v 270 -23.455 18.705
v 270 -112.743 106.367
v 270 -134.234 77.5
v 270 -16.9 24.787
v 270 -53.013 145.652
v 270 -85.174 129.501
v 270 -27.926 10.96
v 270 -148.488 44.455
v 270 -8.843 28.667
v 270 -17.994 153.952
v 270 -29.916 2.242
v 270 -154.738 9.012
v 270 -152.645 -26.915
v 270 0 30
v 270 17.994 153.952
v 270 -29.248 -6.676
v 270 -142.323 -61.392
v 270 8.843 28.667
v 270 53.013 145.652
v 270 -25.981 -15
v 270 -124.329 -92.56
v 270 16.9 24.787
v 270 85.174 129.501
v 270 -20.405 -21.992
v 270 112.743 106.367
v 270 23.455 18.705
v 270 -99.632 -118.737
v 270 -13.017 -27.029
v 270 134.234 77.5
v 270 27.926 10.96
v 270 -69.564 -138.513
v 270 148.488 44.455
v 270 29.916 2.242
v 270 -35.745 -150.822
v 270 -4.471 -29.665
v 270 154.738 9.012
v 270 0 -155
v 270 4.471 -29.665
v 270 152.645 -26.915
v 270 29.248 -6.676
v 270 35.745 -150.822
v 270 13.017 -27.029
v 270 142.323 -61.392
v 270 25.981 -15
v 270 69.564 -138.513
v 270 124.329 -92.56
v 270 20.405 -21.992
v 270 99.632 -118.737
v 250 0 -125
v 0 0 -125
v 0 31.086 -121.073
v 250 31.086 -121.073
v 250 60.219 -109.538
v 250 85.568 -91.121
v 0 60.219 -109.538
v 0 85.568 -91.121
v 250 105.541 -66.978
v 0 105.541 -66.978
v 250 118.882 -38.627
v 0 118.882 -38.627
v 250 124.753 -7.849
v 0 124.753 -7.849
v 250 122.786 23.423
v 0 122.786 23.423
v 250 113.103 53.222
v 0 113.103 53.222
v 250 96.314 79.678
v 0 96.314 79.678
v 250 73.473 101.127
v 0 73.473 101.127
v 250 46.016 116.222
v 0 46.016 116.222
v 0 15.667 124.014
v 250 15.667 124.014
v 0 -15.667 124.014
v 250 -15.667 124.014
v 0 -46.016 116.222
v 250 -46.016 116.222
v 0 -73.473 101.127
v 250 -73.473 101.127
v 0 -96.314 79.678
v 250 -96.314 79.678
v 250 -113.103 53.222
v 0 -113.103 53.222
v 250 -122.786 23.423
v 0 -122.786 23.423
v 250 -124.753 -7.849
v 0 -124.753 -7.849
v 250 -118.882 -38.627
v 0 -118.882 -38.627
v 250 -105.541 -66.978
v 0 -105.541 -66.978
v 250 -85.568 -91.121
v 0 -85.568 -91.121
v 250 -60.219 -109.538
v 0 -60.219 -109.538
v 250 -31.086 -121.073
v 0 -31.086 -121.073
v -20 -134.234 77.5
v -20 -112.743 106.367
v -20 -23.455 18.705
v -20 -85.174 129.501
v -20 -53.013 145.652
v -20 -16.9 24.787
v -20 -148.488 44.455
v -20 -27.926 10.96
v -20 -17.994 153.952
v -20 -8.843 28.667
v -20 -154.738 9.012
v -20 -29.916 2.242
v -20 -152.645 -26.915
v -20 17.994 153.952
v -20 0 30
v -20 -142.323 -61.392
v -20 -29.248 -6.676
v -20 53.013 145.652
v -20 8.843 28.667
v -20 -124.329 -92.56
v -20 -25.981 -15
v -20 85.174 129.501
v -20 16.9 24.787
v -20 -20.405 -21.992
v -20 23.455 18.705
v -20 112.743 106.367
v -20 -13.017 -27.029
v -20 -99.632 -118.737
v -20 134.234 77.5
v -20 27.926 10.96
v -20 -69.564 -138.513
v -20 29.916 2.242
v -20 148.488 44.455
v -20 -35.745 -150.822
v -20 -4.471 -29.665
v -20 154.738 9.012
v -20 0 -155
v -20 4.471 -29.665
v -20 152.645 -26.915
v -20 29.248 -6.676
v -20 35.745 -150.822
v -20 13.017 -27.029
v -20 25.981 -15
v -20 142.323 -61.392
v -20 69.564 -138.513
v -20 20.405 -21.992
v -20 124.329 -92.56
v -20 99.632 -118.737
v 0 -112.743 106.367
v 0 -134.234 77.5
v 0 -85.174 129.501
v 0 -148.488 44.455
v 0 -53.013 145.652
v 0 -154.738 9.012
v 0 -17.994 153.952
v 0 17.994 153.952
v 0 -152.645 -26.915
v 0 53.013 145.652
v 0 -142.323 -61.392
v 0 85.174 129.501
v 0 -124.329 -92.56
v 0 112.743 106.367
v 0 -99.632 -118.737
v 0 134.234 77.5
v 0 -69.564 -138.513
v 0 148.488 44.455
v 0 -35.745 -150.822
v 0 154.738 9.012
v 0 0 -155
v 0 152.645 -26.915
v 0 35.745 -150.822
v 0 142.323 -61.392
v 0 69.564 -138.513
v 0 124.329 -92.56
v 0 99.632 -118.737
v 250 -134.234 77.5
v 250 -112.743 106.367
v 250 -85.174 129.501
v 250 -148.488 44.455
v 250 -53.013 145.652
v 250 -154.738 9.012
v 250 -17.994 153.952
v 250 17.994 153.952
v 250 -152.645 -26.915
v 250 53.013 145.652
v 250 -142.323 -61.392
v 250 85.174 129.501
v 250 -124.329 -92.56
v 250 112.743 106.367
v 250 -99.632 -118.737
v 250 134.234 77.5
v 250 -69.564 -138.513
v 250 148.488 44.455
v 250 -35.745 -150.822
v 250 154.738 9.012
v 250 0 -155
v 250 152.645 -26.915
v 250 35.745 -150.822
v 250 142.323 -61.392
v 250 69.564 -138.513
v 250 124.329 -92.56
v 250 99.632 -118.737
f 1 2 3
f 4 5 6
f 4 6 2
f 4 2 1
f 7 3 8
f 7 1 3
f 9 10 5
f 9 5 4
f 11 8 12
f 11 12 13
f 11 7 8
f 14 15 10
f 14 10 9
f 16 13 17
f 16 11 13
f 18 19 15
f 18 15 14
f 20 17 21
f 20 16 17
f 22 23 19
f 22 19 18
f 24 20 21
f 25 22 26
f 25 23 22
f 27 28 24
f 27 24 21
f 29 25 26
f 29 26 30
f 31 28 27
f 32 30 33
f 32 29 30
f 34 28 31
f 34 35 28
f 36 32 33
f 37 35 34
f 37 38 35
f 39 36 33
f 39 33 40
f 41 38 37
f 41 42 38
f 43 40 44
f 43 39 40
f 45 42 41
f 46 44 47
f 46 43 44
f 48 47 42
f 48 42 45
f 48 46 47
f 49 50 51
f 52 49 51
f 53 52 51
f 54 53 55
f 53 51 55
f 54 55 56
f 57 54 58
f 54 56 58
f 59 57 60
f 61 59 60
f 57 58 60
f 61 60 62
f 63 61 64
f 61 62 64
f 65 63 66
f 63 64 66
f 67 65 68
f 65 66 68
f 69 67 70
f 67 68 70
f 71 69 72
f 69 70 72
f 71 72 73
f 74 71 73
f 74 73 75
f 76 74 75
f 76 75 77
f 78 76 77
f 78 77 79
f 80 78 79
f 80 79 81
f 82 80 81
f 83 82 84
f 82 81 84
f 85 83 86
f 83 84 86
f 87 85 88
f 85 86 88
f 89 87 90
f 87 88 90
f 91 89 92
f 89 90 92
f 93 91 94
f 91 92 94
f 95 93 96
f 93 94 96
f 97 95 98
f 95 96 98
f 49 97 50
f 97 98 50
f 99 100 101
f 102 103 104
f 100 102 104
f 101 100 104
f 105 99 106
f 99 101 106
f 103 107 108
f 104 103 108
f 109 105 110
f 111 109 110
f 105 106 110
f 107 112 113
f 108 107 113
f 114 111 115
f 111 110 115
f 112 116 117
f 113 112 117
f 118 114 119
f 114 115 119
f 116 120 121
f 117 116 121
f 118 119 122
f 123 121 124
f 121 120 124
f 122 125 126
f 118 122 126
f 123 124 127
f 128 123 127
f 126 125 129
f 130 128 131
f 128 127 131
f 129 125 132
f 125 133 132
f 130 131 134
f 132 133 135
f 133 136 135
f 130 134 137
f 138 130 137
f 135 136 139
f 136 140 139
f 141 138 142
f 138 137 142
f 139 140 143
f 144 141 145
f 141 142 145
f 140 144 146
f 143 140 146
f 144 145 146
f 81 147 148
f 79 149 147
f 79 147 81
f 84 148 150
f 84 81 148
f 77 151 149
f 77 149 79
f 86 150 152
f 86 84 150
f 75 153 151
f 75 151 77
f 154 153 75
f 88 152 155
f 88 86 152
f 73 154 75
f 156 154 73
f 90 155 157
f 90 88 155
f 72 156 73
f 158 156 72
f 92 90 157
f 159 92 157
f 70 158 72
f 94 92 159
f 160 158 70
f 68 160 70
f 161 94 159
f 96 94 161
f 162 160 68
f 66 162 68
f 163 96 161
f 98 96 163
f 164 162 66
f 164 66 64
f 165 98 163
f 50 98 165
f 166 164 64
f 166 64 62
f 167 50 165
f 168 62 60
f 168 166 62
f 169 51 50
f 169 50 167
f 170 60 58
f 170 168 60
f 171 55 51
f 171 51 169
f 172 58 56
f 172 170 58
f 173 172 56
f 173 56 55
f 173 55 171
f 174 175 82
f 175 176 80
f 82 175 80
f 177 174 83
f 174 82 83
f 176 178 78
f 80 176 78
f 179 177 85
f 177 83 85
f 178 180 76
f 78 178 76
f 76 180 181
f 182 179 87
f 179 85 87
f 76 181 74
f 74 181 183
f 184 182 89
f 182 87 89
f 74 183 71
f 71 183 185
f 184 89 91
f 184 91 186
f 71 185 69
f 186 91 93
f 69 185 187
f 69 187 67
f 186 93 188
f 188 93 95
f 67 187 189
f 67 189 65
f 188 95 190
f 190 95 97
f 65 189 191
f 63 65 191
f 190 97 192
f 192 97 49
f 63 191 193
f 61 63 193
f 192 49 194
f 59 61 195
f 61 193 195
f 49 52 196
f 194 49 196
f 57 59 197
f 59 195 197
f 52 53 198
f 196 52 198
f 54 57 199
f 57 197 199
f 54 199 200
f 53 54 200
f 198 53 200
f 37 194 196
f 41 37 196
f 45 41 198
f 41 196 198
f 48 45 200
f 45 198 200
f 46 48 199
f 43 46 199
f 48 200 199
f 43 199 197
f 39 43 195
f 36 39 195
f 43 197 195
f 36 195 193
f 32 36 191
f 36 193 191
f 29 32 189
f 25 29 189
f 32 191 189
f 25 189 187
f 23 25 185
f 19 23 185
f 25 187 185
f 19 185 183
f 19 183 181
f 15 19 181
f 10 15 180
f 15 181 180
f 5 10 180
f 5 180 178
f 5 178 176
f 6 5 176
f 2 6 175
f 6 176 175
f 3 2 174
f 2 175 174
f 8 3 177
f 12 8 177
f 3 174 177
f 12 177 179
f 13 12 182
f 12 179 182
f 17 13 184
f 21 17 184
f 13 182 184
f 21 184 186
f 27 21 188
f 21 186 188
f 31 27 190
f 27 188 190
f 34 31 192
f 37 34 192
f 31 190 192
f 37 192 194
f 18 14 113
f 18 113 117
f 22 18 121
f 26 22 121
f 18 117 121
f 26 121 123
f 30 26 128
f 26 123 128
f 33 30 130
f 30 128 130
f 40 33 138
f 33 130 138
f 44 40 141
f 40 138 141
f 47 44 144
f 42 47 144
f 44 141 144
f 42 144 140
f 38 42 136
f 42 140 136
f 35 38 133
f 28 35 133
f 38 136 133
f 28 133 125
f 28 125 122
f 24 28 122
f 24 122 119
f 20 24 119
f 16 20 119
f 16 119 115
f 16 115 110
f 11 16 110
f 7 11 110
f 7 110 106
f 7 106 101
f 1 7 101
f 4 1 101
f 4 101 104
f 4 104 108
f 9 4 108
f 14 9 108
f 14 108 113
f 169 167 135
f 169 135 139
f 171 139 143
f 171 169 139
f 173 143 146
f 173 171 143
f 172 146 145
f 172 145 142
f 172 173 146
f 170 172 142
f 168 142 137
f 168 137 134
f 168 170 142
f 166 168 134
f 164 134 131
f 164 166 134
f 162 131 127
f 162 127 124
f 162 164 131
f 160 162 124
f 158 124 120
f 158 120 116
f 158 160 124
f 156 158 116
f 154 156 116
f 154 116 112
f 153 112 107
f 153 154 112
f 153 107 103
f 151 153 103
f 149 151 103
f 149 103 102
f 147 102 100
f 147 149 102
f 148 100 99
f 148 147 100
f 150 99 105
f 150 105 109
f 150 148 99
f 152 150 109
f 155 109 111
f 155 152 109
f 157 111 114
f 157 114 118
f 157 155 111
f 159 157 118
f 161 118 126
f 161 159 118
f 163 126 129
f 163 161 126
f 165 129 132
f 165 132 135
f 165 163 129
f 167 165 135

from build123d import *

# Parameters (mm, degrees)
SKETCH1_R           = 125
BOSS_EXTRUDE1_DEPTH = 250
SKETCH2_R           = 155
BOSS_EXTRUDE2_DEPTH = 20
SKETCH3_R           = 30
CUT_EXTRUDE1_DEPTH  = 364.524414586


with BuildPart() as part:
    # Sketch1 → Boss-Extrude1 (new body)
    with BuildSketch(Plane(origin=(0, 0, 0), x_dir=(0, 0, -1), z_dir=(1, 0, 0))):
        Circle(SKETCH1_R)
    extrude(amount=BOSS_EXTRUDE1_DEPTH)

    # Sketch2 → Boss-Extrude2 (add)
    with BuildSketch(Plane(origin=(0, 0, 0), x_dir=(0, 0, -1), z_dir=(1, 0, 0))):
        Circle(SKETCH2_R)
    boss_extrude2 = extrude(amount=-BOSS_EXTRUDE2_DEPTH)

    # Mirror1: Boss-Extrude2 across plane
    add(boss_extrude2.mirror(Plane(origin=(125, 0, 0), x_dir=(0, 0, 1), z_dir=(1, 0, 0))))

    # Sketch3 → Cut-Extrude1 (cut, through all)
    with BuildSketch(Plane.ZY.offset(20)):
        Circle(SKETCH3_R)
    extrude(amount=-CUT_EXTRUDE1_DEPTH, mode=Mode.SUBTRACT)


solid = part.part
